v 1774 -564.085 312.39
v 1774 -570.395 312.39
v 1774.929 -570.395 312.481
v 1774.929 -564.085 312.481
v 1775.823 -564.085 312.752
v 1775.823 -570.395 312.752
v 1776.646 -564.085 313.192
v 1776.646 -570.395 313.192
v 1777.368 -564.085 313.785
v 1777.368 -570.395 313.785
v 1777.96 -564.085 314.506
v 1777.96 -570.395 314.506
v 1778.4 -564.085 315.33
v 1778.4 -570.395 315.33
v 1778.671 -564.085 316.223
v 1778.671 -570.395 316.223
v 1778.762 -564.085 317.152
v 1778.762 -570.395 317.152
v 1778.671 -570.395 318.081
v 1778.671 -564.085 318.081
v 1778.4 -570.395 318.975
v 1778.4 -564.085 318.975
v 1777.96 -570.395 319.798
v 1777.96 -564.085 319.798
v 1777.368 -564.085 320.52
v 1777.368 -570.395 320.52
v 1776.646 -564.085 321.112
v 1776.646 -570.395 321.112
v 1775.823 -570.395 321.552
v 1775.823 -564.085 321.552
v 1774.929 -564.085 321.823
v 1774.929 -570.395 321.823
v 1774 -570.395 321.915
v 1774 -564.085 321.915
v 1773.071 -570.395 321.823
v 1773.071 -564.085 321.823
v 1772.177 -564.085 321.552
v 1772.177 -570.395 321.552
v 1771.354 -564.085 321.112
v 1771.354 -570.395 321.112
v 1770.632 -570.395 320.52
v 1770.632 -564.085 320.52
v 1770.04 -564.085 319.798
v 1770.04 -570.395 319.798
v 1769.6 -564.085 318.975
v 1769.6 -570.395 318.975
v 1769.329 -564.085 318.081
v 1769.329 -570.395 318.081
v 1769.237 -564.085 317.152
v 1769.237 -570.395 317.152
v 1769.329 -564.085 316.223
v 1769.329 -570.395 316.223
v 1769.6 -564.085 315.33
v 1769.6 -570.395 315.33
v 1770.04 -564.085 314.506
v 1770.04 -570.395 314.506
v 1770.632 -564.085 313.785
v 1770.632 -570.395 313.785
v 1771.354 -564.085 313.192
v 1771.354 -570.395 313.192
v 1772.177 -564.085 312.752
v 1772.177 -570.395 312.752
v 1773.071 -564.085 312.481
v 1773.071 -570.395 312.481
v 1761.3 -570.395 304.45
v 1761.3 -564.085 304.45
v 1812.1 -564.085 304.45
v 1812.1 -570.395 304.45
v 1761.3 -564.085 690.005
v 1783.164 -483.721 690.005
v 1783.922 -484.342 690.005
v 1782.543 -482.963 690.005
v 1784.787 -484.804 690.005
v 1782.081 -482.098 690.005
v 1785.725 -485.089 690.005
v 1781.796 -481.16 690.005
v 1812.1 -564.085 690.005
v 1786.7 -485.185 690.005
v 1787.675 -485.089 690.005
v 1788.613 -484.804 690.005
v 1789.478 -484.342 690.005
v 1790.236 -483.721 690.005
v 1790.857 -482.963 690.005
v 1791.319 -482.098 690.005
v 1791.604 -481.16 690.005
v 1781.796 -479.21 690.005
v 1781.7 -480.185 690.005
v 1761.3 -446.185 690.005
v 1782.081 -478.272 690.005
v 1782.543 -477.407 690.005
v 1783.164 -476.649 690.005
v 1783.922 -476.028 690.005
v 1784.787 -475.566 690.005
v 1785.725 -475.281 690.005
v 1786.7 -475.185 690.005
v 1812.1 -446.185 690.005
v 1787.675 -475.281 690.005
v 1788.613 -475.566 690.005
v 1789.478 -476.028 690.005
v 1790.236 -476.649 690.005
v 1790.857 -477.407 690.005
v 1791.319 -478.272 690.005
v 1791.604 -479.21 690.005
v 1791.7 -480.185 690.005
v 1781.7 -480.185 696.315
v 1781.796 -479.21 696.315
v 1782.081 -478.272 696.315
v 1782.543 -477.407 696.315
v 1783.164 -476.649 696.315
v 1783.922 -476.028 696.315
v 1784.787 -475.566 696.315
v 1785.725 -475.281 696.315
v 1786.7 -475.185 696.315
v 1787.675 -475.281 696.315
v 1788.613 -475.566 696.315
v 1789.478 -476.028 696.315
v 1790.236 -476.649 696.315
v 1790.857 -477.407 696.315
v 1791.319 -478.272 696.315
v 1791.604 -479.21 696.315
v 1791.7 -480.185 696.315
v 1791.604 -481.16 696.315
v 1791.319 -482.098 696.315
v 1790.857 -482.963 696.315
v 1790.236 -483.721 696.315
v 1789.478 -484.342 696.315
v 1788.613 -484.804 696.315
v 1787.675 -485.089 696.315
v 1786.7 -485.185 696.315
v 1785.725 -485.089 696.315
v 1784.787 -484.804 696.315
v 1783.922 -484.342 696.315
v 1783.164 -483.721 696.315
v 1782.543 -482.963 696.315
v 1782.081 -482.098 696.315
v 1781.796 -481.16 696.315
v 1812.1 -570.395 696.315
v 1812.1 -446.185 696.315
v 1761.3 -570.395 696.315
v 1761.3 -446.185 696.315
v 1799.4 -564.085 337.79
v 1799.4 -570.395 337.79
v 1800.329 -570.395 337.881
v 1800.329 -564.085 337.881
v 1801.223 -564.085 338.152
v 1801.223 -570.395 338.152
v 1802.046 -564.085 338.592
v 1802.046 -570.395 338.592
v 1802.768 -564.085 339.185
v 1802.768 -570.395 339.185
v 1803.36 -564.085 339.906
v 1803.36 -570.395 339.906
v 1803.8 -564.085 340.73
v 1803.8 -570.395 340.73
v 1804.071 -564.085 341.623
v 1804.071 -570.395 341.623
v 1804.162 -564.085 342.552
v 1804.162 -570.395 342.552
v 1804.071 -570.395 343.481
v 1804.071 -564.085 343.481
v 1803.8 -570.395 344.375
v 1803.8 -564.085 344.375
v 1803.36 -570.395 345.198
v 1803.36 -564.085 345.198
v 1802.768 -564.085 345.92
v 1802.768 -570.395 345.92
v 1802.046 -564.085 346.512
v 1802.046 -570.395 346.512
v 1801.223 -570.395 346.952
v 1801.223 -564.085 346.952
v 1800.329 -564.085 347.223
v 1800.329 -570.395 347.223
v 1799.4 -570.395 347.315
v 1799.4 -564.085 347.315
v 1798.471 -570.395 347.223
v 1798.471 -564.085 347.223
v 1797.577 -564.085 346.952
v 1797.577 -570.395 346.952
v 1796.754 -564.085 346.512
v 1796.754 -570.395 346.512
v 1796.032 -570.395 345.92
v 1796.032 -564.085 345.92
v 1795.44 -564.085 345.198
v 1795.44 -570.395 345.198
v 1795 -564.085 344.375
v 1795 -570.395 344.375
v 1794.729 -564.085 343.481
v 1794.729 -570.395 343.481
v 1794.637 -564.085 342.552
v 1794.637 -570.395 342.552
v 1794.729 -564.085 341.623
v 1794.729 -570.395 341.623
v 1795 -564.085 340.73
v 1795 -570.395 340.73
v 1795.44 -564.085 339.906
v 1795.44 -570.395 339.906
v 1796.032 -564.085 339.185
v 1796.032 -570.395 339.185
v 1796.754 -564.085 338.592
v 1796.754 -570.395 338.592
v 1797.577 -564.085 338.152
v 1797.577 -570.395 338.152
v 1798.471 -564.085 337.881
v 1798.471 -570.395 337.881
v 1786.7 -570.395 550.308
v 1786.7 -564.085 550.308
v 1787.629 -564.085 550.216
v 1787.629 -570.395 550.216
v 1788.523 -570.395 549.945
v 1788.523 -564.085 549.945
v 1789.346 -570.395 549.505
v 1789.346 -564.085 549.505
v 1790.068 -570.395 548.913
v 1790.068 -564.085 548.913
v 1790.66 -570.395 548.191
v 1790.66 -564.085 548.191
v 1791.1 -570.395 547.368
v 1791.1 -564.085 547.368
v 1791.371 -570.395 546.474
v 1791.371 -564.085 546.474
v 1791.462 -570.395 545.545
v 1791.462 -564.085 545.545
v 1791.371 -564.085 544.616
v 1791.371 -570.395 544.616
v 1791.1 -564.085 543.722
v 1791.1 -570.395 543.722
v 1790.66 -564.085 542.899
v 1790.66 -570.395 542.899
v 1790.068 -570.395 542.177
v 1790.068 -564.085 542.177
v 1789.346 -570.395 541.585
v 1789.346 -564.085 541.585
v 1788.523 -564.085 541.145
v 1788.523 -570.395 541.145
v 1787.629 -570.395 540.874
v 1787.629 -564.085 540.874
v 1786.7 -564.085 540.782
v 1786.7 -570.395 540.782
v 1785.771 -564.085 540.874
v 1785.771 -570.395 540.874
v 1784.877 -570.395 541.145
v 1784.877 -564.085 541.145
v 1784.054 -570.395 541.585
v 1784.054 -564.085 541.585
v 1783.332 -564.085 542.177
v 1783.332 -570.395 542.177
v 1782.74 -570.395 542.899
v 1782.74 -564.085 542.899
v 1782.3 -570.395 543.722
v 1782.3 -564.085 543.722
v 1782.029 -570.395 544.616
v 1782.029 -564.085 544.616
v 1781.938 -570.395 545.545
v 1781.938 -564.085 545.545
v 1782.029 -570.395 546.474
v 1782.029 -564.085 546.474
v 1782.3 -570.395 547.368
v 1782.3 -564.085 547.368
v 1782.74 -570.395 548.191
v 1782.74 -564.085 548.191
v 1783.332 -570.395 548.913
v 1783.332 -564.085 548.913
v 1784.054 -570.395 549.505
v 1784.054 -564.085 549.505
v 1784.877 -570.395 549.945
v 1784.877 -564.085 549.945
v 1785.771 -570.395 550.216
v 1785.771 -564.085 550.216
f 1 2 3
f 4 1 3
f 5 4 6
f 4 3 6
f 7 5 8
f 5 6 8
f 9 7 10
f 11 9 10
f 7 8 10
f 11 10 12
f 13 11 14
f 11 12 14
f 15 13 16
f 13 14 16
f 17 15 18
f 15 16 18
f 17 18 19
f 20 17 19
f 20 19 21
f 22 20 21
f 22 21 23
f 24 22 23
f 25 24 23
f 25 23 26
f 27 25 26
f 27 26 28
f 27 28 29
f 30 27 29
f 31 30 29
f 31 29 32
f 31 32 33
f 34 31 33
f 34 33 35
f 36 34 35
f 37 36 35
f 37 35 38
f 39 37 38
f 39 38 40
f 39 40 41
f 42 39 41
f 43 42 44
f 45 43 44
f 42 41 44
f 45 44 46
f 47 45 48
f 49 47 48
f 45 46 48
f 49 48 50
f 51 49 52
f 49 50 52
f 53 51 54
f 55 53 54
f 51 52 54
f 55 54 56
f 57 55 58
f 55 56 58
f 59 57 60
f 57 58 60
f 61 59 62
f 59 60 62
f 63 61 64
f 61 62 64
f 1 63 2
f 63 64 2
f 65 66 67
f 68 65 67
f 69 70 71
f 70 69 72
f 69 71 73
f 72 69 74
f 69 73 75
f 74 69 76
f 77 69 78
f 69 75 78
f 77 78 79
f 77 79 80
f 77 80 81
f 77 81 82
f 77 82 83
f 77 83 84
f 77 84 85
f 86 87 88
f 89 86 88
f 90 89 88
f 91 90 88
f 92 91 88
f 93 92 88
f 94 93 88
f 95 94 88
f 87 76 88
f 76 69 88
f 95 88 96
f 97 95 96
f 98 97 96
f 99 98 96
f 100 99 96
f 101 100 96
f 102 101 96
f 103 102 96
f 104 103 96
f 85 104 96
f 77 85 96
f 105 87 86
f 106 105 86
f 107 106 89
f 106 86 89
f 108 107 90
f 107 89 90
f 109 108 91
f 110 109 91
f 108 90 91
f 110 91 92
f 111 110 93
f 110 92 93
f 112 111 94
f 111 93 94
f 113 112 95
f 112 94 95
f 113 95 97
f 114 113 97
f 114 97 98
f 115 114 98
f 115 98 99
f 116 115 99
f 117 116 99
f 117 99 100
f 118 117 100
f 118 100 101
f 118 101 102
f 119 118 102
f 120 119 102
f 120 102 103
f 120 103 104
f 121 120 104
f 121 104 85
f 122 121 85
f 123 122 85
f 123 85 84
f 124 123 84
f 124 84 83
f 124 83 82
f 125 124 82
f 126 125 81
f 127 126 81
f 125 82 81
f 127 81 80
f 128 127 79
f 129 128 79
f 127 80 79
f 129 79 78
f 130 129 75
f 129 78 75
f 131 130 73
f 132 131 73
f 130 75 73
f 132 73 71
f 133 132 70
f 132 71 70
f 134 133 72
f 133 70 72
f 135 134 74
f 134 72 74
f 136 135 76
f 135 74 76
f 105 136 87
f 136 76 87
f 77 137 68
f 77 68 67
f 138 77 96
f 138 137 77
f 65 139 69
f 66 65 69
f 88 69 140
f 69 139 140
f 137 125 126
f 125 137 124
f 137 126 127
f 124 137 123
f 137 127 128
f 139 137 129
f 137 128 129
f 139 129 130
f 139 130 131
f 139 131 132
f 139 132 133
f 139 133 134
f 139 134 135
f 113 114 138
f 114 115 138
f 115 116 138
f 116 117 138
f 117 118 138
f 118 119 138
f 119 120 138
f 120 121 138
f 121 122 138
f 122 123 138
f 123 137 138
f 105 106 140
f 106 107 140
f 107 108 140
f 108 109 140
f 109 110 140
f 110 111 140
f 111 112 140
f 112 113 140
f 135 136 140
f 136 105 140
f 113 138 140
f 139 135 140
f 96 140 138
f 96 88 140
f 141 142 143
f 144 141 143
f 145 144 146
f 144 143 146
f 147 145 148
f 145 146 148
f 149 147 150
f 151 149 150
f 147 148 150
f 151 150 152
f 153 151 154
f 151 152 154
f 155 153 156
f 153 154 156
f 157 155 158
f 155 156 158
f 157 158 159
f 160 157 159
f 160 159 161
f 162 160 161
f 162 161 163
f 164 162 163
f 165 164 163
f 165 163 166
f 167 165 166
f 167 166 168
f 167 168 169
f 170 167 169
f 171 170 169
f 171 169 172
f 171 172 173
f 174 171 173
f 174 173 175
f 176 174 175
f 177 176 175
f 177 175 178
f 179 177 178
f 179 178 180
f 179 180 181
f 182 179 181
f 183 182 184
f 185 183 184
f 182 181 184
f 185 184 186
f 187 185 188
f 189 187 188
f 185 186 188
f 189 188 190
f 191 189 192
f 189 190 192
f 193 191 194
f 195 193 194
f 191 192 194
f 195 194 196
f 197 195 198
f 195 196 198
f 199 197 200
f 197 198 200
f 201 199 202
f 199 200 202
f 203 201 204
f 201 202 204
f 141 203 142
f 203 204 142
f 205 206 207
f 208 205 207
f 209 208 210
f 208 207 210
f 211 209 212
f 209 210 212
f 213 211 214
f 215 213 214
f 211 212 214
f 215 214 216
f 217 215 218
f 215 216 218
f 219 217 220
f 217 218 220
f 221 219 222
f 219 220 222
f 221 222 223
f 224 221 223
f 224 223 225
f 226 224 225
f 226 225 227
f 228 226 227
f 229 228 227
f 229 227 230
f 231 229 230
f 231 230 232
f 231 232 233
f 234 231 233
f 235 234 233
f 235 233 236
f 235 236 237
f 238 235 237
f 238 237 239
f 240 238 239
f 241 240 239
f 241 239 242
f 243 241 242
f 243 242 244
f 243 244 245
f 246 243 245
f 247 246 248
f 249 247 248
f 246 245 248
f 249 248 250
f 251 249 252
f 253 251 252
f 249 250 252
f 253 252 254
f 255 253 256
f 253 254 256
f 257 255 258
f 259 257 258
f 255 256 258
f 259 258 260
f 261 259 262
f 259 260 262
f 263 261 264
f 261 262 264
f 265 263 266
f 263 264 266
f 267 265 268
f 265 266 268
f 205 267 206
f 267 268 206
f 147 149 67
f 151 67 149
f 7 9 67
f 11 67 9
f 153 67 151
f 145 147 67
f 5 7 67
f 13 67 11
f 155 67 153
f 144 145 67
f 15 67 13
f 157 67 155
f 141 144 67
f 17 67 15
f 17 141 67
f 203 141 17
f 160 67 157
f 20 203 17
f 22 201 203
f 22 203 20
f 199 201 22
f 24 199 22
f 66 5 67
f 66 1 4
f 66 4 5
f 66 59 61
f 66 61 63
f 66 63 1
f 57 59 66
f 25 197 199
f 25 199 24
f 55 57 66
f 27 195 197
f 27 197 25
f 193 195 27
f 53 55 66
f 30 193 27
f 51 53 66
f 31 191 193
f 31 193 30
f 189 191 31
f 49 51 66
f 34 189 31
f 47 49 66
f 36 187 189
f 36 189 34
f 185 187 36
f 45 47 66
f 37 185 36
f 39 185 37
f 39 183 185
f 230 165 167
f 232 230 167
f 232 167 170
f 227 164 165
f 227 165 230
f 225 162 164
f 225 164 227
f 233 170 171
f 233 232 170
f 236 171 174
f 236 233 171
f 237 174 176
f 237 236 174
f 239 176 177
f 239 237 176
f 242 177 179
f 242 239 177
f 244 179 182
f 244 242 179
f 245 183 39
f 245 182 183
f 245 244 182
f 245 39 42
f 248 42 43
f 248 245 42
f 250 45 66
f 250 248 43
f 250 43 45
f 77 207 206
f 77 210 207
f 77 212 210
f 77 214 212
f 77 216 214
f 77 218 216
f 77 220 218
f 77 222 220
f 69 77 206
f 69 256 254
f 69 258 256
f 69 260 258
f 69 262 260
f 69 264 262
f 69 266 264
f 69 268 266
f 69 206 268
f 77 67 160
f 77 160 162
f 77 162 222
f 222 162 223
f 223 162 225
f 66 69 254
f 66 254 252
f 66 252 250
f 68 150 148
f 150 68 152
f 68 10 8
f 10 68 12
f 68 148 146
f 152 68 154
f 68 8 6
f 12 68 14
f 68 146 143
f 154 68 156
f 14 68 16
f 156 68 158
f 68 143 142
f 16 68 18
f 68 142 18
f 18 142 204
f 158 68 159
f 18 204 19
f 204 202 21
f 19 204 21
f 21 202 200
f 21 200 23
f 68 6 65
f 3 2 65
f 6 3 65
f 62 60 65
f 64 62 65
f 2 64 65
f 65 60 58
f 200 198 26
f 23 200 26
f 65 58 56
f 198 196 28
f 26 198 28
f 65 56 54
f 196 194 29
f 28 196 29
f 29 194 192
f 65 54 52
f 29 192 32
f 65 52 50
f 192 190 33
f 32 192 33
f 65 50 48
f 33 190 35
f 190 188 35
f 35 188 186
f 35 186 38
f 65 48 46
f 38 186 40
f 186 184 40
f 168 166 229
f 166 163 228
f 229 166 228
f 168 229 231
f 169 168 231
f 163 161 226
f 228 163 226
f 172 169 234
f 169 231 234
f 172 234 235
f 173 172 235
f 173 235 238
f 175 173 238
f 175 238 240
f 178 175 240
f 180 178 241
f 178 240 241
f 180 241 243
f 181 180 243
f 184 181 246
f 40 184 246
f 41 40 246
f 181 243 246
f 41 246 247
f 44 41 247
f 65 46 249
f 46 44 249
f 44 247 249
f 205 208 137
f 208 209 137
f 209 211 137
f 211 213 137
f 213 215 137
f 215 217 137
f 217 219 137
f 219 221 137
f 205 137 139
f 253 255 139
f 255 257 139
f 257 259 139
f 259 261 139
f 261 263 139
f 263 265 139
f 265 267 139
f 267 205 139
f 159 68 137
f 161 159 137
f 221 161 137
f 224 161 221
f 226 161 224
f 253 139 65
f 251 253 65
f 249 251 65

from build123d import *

# Parameters (mm, degrees)
CROQUIS2_W              = 50.8
CROQUIS2_H              = 6.31
CROQUIS3_W              = 50.8
CROQUIS3_H              = 6.31
CROQUIS4_W              = 60
CROQUIS4_H              = 53.155
SALIENTE_EXTRUIR1_DEPTH = 6.31
CROQUIS5_W              = 60
CROQUIS5_H              = 6.31
CORTAR_EXTRUIR1_DEPTH   = 6.31
CORTAR_EXTRUIR2_DEPTH   = 634
CROQUIS8_W              = 50.8
CROQUIS8_H              = 6.31
SALIENTE_EXTRUIR2_DEPTH = 63.5
CROQUIS9_R              = 5
CORTAR_EXTRUIR3_DEPTH   = 10
CROQUIS10_W             = 790.847933
CROQUIS10_H             = 6.31
CORTAR_EXTRUIR4_DEPTH   = 286
CROQUIS11_W             = 50.8
CROQUIS11_H             = 6.31
CROQUIS11_W_2           = 210
CORTAR_EXTRUIR5_DEPTH   = 13.11
CROQUIS12_W             = 50.8
CROQUIS12_H             = 6.31
SALIENTE_EXTRUIR3_DEPTH = 6.35
CROQUIS13_W             = 50.8
CROQUIS13_H             = 6.35
CORTAR_EXTRUIR6_DEPTH   = 6.35
CROQUIS14_W             = 85.847108528
CROQUIS14_H             = 473.639219469
CORTAR_EXTRUIR7_DEPTH   = 137
CROQUIS15_R             = 4.7625
CORTAR_EXTRUIR8_DEPTH   = 33
CROQUIS16_R             = 5
CORTAR_EXTRUIR9_DEPTH   = 33
CROQUIS18_R             = 4.7625
CORTAR_EXTRUIR10_DEPTH  = 50


with BuildPart() as part:
    # Barrer1: sweep along a curve in space
    with BuildLine() as barrer1_path:
        Line((0, 0, 0), (0, -567.24, 0))
        Line((0, -567.24, 0), (0, -567.24, 336.2))
        Line((0, -567.24, 336.2), (1786.7, -567.24, 336.2))
        Line((1786.7, -567.24, 336.2), (1786.7, -567.24, 693.16))
        Line((1786.7, -567.24, 693.16), (1786.7, -436.23, 693.16))
        Line((1786.7, -436.23, 693.16), (1786.7, -436.23, 1487.162933))
    # Croquis2 → Barrer1 (sweep)
    with BuildSketch(Plane(origin=(0, 0, 0), x_dir=(1, 0, 0), z_dir=(0, 1, 0))):
        Rectangle(CROQUIS2_W, CROQUIS2_H)
        with Locations((210, 0)):
            Rectangle(CROQUIS2_W, CROQUIS2_H)
    sweep(path=barrer1_path.line, transition=Transition.RIGHT)

    # Barrer4: sweep along a curve in space
    with BuildLine() as barrer4_path:
        Line((-0.201028049, -3.155, -3.155), (-0.201028049, -3.155, -207.155))
        Line((-0.201028049, -3.155, -207.155), (-0.201028049, -53.155, -207.155))
    # Croquis3 → Barrer4 (sweep)
    with BuildSketch(Plane(origin=(0, 0, -3.155), x_dir=(-1, 0, 0), z_dir=(0, 0, -1))):
        with Locations((-210, -3.155)):
            Rectangle(CROQUIS3_W, CROQUIS3_H)
        with Locations((0, -3.155)):
            Rectangle(CROQUIS3_W, CROQUIS3_H)
    sweep(path=barrer4_path.line, transition=Transition.RIGHT)

    # Croquis4 → Saliente-Extruir1 (add)
    with BuildSketch(Plane(origin=(0, 0, -210.31), x_dir=(-1, 0, 0), z_dir=(0, 0, -1))):
        with Locations((-154.6, -26.5775)):
            Rectangle(CROQUIS4_W, CROQUIS4_H)
    extrude(amount=-SALIENTE_EXTRUIR1_DEPTH)

    # Croquis5 → Cortar-Extruir1 (cut)
    with BuildSketch(Plane.XY.offset(-204)):
        with Locations((154.6, -3.155)):
            Rectangle(CROQUIS5_W, CROQUIS5_H)
    extrude(amount=-CORTAR_EXTRUIR1_DEPTH, mode=Mode.SUBTRACT)

    # Croquis7 → Cortar-Extruir2 (cut)
    with BuildSketch(Plane(origin=(0, 0, 0), x_dir=(1, 0, 0), z_dir=(0, 1, 0))):
        Polygon((1761.3, -361.6), (2022.1, -361.6), (2022.1, 278.600557529), (-188.115947115, 278.600557529), (-188.115947115, -361.6), align=None)
    extrude(amount=-CORTAR_EXTRUIR2_DEPTH, mode=Mode.SUBTRACT)

    # Croquis8 → Saliente-Extruir2 (add)
    with BuildSketch(Plane(origin=(0, 0, 361.6), x_dir=(-1, 0, 0), z_dir=(0, 0, -1))):
        with Locations((-1786.7, -567.24)):
            Rectangle(CROQUIS8_W, CROQUIS8_H)
    extrude(amount=SALIENTE_EXTRUIR2_DEPTH)

    # Croquis9 → Cortar-Extruir3 (cut)
    with BuildSketch(Plane(origin=(0, -433.075, 0), x_dir=(1, 0, 0), z_dir=(0, 1, 0))):
        with Locations(Location((1786.7, -1454.162933, 0), (0, 0, 270))):
            Circle(CROQUIS9_R)
        with Locations(Location((1786.7, -1234.162933, 0), (0, 0, 270))):
            Circle(CROQUIS9_R)
        with Locations(Location((1996.7, -1234.162933, 0), (0, 0, 270))):
            Circle(CROQUIS9_R)
        with Locations(Location((1996.7, -1454.162933, 0), (0, 0, 270))):
            Circle(CROQUIS9_R)
    extrude(amount=-CORTAR_EXTRUIR3_DEPTH, mode=Mode.SUBTRACT)

    # Croquis10 → Cortar-Extruir4 (cut)
    with BuildSketch(Plane(origin=(2022.1, 0, 0), x_dir=(0, 0, -1), z_dir=(1, 0, 0))):
        with Locations((-1091.7389665, -436.23)):
            Rectangle(CROQUIS10_W, CROQUIS10_H)
    extrude(amount=-CORTAR_EXTRUIR4_DEPTH, mode=Mode.SUBTRACT)

    # Croquis11 → Cortar-Extruir5 (cut)
    with BuildSketch(Plane(origin=(0, -433.075, 0), x_dir=(1, 0, 0), z_dir=(0, 1, 0))):
        with Locations((1996.7, -693.16)):
            Rectangle(CROQUIS11_W, CROQUIS11_H)
        with Locations((1866.3, -693.16)):
            Rectangle(CROQUIS11_W_2, CROQUIS11_H)
    extrude(amount=-CORTAR_EXTRUIR5_DEPTH, mode=Mode.SUBTRACT)

    # Croquis12 → Saliente-Extruir3 (add)
    with BuildSketch(Plane(origin=(0, 0, 361.6), x_dir=(-1, 0, 0), z_dir=(0, 0, -1))):
        with Locations((-1996.7, -567.24)):
            Rectangle(CROQUIS12_W, CROQUIS12_H)
    extrude(amount=SALIENTE_EXTRUIR3_DEPTH)

    # Croquis13 → Cortar-Extruir6 (cut)
    with BuildSketch(Plane(origin=(0, -564.085, 0), x_dir=(1, 0, 0), z_dir=(0, 1, 0))):
        with Locations((1786.7, -301.275)):
            Rectangle(CROQUIS13_W, CROQUIS13_H)
    extrude(amount=-CORTAR_EXTRUIR6_DEPTH, mode=Mode.SUBTRACT)

    # Croquis14 → Cortar-Extruir7 (cut)
    with BuildSketch(Plane(origin=(0, -446.185, 0), x_dir=(1, 0, 0), z_dir=(0, 1, 0))):
        with Locations((1999.254154868, -571.717300183)):
            Rectangle(CROQUIS14_W, CROQUIS14_H)
    extrude(amount=-CORTAR_EXTRUIR7_DEPTH, mode=Mode.SUBTRACT)

    # Croquis15 → Cortar-Extruir8 (cut)
    with BuildSketch(Plane(origin=(0, -564.085, 0), x_dir=(1, 0, 0), z_dir=(0, 1, 0))):
        with Locations(Location((1786.7, -545.545, 0), (0, 0, 270))):
            Circle(CROQUIS15_R)
    extrude(amount=-CORTAR_EXTRUIR8_DEPTH, mode=Mode.SUBTRACT)

    # Croquis16 → Cortar-Extruir9 (cut)
    with BuildSketch(Plane(origin=(0, 0, 690.005), x_dir=(-1, 0, 0), z_dir=(0, 0, -1))):
        with Locations((-1786.7, -480.185)):
            Circle(CROQUIS16_R)
    extrude(amount=-CORTAR_EXTRUIR9_DEPTH, mode=Mode.SUBTRACT)

    # Croquis18 → Cortar-Extruir10 (cut)
    with BuildSketch(Plane(origin=(0, -570.395, 0), x_dir=(-1, 0, 0), z_dir=(0, -1, 0))):
        with Locations(Location((-1799.399999999, -342.552204666, 0), (0, 0, 90))):
            Circle(CROQUIS18_R)
        with Locations(Location((-1773.999999999, -317.152204666, 0), (0, 0, 90))):
            Circle(CROQUIS18_R)
    extrude(amount=-CORTAR_EXTRUIR10_DEPTH, mode=Mode.SUBTRACT)


solid = part.part
